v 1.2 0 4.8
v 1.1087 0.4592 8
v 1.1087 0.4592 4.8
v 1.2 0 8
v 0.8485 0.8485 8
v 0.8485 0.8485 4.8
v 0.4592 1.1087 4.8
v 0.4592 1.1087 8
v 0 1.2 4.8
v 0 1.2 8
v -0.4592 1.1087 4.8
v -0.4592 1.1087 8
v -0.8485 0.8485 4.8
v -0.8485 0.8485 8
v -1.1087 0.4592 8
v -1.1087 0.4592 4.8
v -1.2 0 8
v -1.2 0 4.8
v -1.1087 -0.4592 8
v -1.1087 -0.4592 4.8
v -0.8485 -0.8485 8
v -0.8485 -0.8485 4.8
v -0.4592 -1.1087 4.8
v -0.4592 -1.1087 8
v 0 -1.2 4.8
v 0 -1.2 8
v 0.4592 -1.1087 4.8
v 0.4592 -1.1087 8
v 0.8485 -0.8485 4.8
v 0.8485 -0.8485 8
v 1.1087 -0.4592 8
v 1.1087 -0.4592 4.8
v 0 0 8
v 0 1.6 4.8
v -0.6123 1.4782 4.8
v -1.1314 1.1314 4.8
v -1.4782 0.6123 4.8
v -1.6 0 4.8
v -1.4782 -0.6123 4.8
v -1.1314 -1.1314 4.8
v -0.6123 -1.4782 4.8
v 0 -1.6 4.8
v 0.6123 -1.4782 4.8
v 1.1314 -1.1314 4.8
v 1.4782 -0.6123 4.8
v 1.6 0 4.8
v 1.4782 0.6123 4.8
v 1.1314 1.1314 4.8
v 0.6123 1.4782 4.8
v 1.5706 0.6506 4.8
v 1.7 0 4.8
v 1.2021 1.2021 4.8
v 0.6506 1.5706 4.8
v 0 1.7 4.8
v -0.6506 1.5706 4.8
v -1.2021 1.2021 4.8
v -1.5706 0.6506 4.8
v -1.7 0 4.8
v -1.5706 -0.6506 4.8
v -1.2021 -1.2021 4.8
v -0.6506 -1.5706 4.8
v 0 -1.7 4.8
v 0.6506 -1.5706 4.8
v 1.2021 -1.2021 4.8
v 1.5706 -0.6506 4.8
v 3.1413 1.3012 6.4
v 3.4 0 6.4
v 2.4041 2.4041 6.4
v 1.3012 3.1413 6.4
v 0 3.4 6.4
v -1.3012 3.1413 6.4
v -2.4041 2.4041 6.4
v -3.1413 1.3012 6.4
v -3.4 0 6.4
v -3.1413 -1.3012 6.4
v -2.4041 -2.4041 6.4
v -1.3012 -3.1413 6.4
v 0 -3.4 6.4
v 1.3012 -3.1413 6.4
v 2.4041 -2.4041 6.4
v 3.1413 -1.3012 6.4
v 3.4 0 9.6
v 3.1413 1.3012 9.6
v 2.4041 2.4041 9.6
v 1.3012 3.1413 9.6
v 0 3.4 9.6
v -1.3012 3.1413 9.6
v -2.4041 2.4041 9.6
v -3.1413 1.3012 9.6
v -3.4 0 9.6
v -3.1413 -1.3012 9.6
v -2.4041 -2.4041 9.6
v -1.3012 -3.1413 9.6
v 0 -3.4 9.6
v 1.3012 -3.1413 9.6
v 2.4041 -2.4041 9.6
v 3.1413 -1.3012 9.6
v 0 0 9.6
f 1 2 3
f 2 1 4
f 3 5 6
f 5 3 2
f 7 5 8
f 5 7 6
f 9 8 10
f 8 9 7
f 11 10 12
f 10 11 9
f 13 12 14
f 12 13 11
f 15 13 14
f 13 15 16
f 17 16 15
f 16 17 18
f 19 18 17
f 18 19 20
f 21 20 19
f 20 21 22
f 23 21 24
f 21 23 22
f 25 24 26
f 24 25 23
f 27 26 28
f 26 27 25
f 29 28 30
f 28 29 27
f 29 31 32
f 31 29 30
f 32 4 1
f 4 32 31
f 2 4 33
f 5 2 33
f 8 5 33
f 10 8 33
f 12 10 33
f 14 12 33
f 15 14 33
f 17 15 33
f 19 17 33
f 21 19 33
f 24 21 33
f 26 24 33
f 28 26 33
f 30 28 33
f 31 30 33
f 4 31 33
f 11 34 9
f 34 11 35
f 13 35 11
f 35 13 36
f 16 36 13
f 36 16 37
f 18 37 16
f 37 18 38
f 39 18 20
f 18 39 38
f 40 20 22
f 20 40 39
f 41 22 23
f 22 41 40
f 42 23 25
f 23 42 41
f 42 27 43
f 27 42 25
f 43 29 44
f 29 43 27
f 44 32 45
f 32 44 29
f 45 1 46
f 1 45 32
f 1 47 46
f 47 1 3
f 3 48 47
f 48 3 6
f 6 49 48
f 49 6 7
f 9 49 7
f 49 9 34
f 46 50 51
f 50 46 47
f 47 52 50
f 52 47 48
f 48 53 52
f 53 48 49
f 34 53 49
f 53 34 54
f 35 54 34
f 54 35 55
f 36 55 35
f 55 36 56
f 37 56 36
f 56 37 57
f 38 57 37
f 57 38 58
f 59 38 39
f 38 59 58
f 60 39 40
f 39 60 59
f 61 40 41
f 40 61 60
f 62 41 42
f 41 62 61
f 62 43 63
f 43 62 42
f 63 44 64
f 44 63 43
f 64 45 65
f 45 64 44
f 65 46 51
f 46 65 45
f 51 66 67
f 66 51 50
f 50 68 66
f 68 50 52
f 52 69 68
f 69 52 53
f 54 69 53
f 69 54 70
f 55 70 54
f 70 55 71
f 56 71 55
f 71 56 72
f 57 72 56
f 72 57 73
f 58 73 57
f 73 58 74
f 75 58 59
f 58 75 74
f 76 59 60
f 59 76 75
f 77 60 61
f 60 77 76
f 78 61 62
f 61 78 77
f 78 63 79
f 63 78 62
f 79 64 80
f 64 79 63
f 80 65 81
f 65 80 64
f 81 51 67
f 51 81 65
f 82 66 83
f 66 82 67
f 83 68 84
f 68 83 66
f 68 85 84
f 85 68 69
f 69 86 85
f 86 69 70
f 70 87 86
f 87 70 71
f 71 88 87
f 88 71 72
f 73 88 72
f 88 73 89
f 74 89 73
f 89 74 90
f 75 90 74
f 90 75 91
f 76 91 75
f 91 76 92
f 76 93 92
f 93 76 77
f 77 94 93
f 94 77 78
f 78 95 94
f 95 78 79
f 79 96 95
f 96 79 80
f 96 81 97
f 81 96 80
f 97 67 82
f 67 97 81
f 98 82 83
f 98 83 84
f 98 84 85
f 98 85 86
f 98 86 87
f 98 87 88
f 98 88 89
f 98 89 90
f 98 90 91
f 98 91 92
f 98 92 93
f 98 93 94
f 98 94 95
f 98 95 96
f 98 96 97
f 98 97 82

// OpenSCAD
// file: ../../p/4-4ring3.scad
use <../lib.scad>
function ldraw_lib__4_4ring3() = [
// 0 Ring  3 x 1.0
// 0 Name: 4-4ring3.dat
// 0 Author: James Jessiman
// 0 !LDRAW_ORG Primitive UPDATE 2009-01
// 0 !LICENSE Licensed under CC BY 4.0 : see CAreadme.txt
// 
// 0 BFC CERTIFY CCW
  [0,"BFC","CERTIFY"],
  [0,"BFC","CCW"],
// 
// 0 !HISTORY 1998-12-15 [PTadmin] Official Update 1998-10
// 0 !HISTORY 2002-04-05 [hafhead] Added BFC statement
// 0 !HISTORY 2002-04-25 [PTadmin] Official Update 2002-02
// 0 !HISTORY 2007-06-24 [PTadmin] Header formatted for Contributor Agreement
// 0 !HISTORY 2008-07-01 [PTadmin] Official Update 2008-01
// 0 !HISTORY 2008-08-26 [cwdee] Switch polygon winding and rename
// 0 !HISTORY 2009-05-02 [PTadmin] Official Update 2009-01
// 
// 
// 4 16 -1.5308 0 3.6956 -1.1481 0 2.7717 0 0 3 0 0 4
  [4,16,-1.5308,0,3.6956,-1.1481,0,2.7717,0,0,3,0,0,4],
// 4 16 -2.8284 0 2.8284 -2.1213 0 2.1213 -1.1481 0 2.7717 -1.5308 0 3.6956
  [4,16,-2.8284,0,2.8284,-2.1213,0,2.1213,-1.1481,0,2.7717,-1.5308,0,3.6956],
// 4 16 -3.6956 0 1.5308 -2.7717 0 1.1481 -2.1213 0 2.1213 -2.8284 0 2.8284
  [4,16,-3.6956,0,1.5308,-2.7717,0,1.1481,-2.1213,0,2.1213,-2.8284,0,2.8284],
// 4 16 -4 0 0 -3 0 0 -2.7717 0 1.1481 -3.6956 0 1.5308
  [4,16,-4,0,0,-3,0,0,-2.7717,0,1.1481,-3.6956,0,1.5308],
// 4 16 -3.6956 0 -1.5308 -2.7717 0 -1.1481 -3 0 0 -4 0 0
  [4,16,-3.6956,0,-1.5308,-2.7717,0,-1.1481,-3,0,0,-4,0,0],
// 4 16 -2.8284 0 -2.8284 -2.1213 0 -2.1213 -2.7717 0 -1.1481 -3.6956 0 -1.5308
  [4,16,-2.8284,0,-2.8284,-2.1213,0,-2.1213,-2.7717,0,-1.1481,-3.6956,0,-1.5308],
// 4 16 -1.5308 0 -3.6956 -1.1481 0 -2.7717 -2.1213 0 -2.1213 -2.8284 0 -2.8284
  [4,16,-1.5308,0,-3.6956,-1.1481,0,-2.7717,-2.1213,0,-2.1213,-2.8284,0,-2.8284],
// 4 16 0 0 -4 0 0 -3 -1.1481 0 -2.7717 -1.5308 0 -3.6956
  [4,16,0,0,-4,0,0,-3,-1.1481,0,-2.7717,-1.5308,0,-3.6956],
// 4 16 1.5308 0 -3.6956 1.1481 0 -2.7717 0 0 -3 0 0 -4
  [4,16,1.5308,0,-3.6956,1.1481,0,-2.7717,0,0,-3,0,0,-4],
// 4 16 2.8284 0 -2.8284 2.1213 0 -2.1213 1.1481 0 -2.7717 1.5308 0 -3.6956
  [4,16,2.8284,0,-2.8284,2.1213,0,-2.1213,1.1481,0,-2.7717,1.5308,0,-3.6956],
// 4 16 3.6956 0 -1.5308 2.7717 0 -1.1481 2.1213 0 -2.1213 2.8284 0 -2.8284
  [4,16,3.6956,0,-1.5308,2.7717,0,-1.1481,2.1213,0,-2.1213,2.8284,0,-2.8284],
// 4 16 4 0 0 3 0 0 2.7717 0 -1.1481 3.6956 0 -1.5308
  [4,16,4,0,0,3,0,0,2.7717,0,-1.1481,3.6956,0,-1.5308],
// 4 16 3.6956 0 1.5308 2.7717 0 1.1481 3 0 0 4 0 0
  [4,16,3.6956,0,1.5308,2.7717,0,1.1481,3,0,0,4,0,0],
// 4 16 2.8284 0 2.8284 2.1213 0 2.1213 2.7717 0 1.1481 3.6956 0 1.5308
  [4,16,2.8284,0,2.8284,2.1213,0,2.1213,2.7717,0,1.1481,3.6956,0,1.5308],
// 4 16 1.5308 0 3.6956 1.1481 0 2.7717 2.1213 0 2.1213 2.8284 0 2.8284
  [4,16,1.5308,0,3.6956,1.1481,0,2.7717,2.1213,0,2.1213,2.8284,0,2.8284],
// 4 16 0 0 4 0 0 3 1.1481 0 2.7717 1.5308 0 3.6956
  [4,16,0,0,4,0,0,3,1.1481,0,2.7717,1.5308,0,3.6956],
// 0
];
module ldraw_lib__4_4ring3(step=0, col=false, unit=2/5, alt=false, line=0.2, solid=!$preview)
    makepoly(ldraw_lib__4_4ring3(), step=step, col=col, unit=unit, alt=alt, line=line, solid=solid);
ldraw_lib__4_4ring3(line=0.2);
// file: ../../p/4-4ring16.scad
use <../lib.scad>
function ldraw_lib__4_4ring16() = [
// 0 Ring 16 x 1.0
// 0 Name: 4-4ring16.dat
// 0 Author: Willy Tschager [Holly-Wood]
// 0 !LDRAW_ORG Primitive UPDATE 2024-02
// 0 !LICENSE Licensed under CC BY 4.0 : see CAreadme.txt
// 
// 0 BFC CERTIFY CCW
  [0,"BFC","CERTIFY"],
  [0,"BFC","CCW"],
// 
// 0 !HISTORY 2009-05-02 [PTadmin] Official Update 2009-01
// 0 !HISTORY 2024-01-11 [Holly-Wood] Complete regeneration, original by guyvivan
// 0 !HISTORY 2024-03-24 [OrionP] Official Update 2024-02
// 
// 4 16 17 0 0 15.7063 0 6.5059 14.7824 0 6.1232 16 0 0
  [4,16,17,0,0,15.7063,0,6.5059,14.7824,0,6.1232,16,0,0],
// 4 16 15.7063 0 6.5059 12.0207 0 12.0207 11.3136 0 11.3136 14.7824 0 6.1232
  [4,16,15.7063,0,6.5059,12.0207,0,12.0207,11.3136,0,11.3136,14.7824,0,6.1232],
// 4 16 12.0207 0 12.0207 6.5059 0 15.7063 6.1232 0 14.7824 11.3136 0 11.3136
  [4,16,12.0207,0,12.0207,6.5059,0,15.7063,6.1232,0,14.7824,11.3136,0,11.3136],
// 4 16 6.5059 0 15.7063 0 0 17 0 0 16 6.1232 0 14.7824
  [4,16,6.5059,0,15.7063,0,0,17,0,0,16,6.1232,0,14.7824],
// 4 16 0 0 17 -6.5059 0 15.7063 -6.1232 0 14.7824 0 0 16
  [4,16,0,0,17,-6.5059,0,15.7063,-6.1232,0,14.7824,0,0,16],
// 4 16 -6.5059 0 15.7063 -12.0207 0 12.0207 -11.3136 0 11.3136 -6.1232 0 14.7824
  [4,16,-6.5059,0,15.7063,-12.0207,0,12.0207,-11.3136,0,11.3136,-6.1232,0,14.7824],
// 4 16 -12.0207 0 12.0207 -15.7063 0 6.5059 -14.7824 0 6.1232 -11.3136 0 11.3136
  [4,16,-12.0207,0,12.0207,-15.7063,0,6.5059,-14.7824,0,6.1232,-11.3136,0,11.3136],
// 4 16 -15.7063 0 6.5059 -17 0 0 -16 0 0 -14.7824 0 6.1232
  [4,16,-15.7063,0,6.5059,-17,0,0,-16,0,0,-14.7824,0,6.1232],
// 4 16 -17 0 0 -15.7063 0 -6.5059 -14.7824 0 -6.1232 -16 0 0
  [4,16,-17,0,0,-15.7063,0,-6.5059,-14.7824,0,-6.1232,-16,0,0],
// 4 16 -15.7063 0 -6.5059 -12.0207 0 -12.0207 -11.3136 0 -11.3136 -14.7824 0 -6.1232
  [4,16,-15.7063,0,-6.5059,-12.0207,0,-12.0207,-11.3136,0,-11.3136,-14.7824,0,-6.1232],
// 4 16 -12.0207 0 -12.0207 -6.5059 0 -15.7063 -6.1232 0 -14.7824 -11.3136 0 -11.3136
  [4,16,-12.0207,0,-12.0207,-6.5059,0,-15.7063,-6.1232,0,-14.7824,-11.3136,0,-11.3136],
// 4 16 -6.5059 0 -15.7063 0 0 -17 0 0 -16 -6.1232 0 -14.7824
  [4,16,-6.5059,0,-15.7063,0,0,-17,0,0,-16,-6.1232,0,-14.7824],
// 4 16 0 0 -17 6.5059 0 -15.7063 6.1232 0 -14.7824 0 0 -16
  [4,16,0,0,-17,6.5059,0,-15.7063,6.1232,0,-14.7824,0,0,-16],
// 4 16 6.5059 0 -15.7063 12.0207 0 -12.0207 11.3136 0 -11.3136 6.1232 0 -14.7824
  [4,16,6.5059,0,-15.7063,12.0207,0,-12.0207,11.3136,0,-11.3136,6.1232,0,-14.7824],
// 4 16 12.0207 0 -12.0207 15.7063 0 -6.5059 14.7824 0 -6.1232 11.3136 0 -11.3136
  [4,16,12.0207,0,-12.0207,15.7063,0,-6.5059,14.7824,0,-6.1232,11.3136,0,-11.3136],
// 4 16 15.7063 0 -6.5059 17 0 0 16 0 0 14.7824 0 -6.1232
  [4,16,15.7063,0,-6.5059,17,0,0,16,0,0,14.7824,0,-6.1232],
// 0 // Build by LDPartEditor (PrimGen 2.X)
];
module ldraw_lib__4_4ring16(step=0, col=false, unit=2/5, alt=false, line=0.2, solid=!$preview)
    makepoly(ldraw_lib__4_4ring16(), step=step, col=col, unit=unit, alt=alt, line=line, solid=solid);
ldraw_lib__4_4ring16(line=0.2);
// file: ../../p/4-4edge.scad
use <../lib.scad>
function ldraw_lib__4_4edge() = [
// 0 Circle 1.0
// 0 Name: 4-4edge.dat
// 0 Author: James Jessiman
// 0 !LDRAW_ORG Primitive UPDATE 2017-01
// 0 !LICENSE Licensed under CC BY 4.0 : see CAreadme.txt
// 
// 0 BFC CERTIFY CCW
  [0,"BFC","CERTIFY"],
  [0,"BFC","CCW"],
// 
// 0 !HISTORY 1998-12-15 [PTadmin] Official Update 1998-10
// 0 !HISTORY 2005-12-28 [PTadmin] Official Update 2005-01
// 0 !HISTORY 2007-06-24 [PTadmin] Header formatted for Contributor Agreement
// 0 !HISTORY 2008-07-01 [PTadmin] Official Update 2008-01
// 0 !HISTORY 2017-01-15 [Steffen] BFCed
// 0 !HISTORY 2017-12-30 [PTadmin] Official Update 2017-01
// 
// 
// 2 24 1 0 0 0.9239 0 0.3827
  [2,24,1,0,0,0.9239,0,0.3827],
// 2 24 0.9239 0 0.3827 0.7071 0 0.7071
  [2,24,0.9239,0,0.3827,0.7071,0,0.7071],
// 2 24 0.7071 0 0.7071 0.3827 0 0.9239
  [2,24,0.7071,0,0.7071,0.3827,0,0.9239],
// 2 24 0.3827 0 0.9239 0 0 1
  [2,24,0.3827,0,0.9239,0,0,1],
// 2 24 0 0 1 -0.3827 0 0.9239
  [2,24,0,0,1,-0.3827,0,0.9239],
// 2 24 -0.3827 0 0.9239 -0.7071 0 0.7071
  [2,24,-0.3827,0,0.9239,-0.7071,0,0.7071],
// 2 24 -0.7071 0 0.7071 -0.9239 0 0.3827
  [2,24,-0.7071,0,0.7071,-0.9239,0,0.3827],
// 2 24 -0.9239 0 0.3827 -1 0 -0
  [2,24,-0.9239,0,0.3827,-1,0,-0],
// 2 24 -1 0 -0 -0.9239 0 -0.3827
  [2,24,-1,0,-0,-0.9239,0,-0.3827],
// 2 24 -0.9239 0 -0.3827 -0.7071 0 -0.7071
  [2,24,-0.9239,0,-0.3827,-0.7071,0,-0.7071],
// 2 24 -0.7071 0 -0.7071 -0.3827 0 -0.9239
  [2,24,-0.7071,0,-0.7071,-0.3827,0,-0.9239],
// 2 24 -0.3827 0 -0.9239 0 0 -1
  [2,24,-0.3827,0,-0.9239,0,0,-1],
// 2 24 0 0 -1 0.3827 0 -0.9239
  [2,24,0,0,-1,0.3827,0,-0.9239],
// 2 24 0.3827 0 -0.9239 0.7071 0 -0.7071
  [2,24,0.3827,0,-0.9239,0.7071,0,-0.7071],
// 2 24 0.7071 0 -0.7071 0.9239 0 -0.3827
  [2,24,0.7071,0,-0.7071,0.9239,0,-0.3827],
// 2 24 0.9239 0 -0.3827 1 0 0
  [2,24,0.9239,0,-0.3827,1,0,0],
];
module ldraw_lib__4_4edge(step=0, col=false, unit=2/5, alt=false, line=0.2, solid=!$preview)
    makepoly(ldraw_lib__4_4edge(), step=step, col=col, unit=unit, alt=alt, line=line, solid=solid);
ldraw_lib__4_4edge(line=0.2);
// file: ../../p/4-4disc.scad
use <../lib.scad>
function ldraw_lib__4_4disc() = [
// 0 Disc 1.0
// 0 Name: 4-4disc.dat
// 0 Author: James Jessiman
// 0 !LDRAW_ORG Primitive UPDATE 2002-02
// 0 !LICENSE Licensed under CC BY 4.0 : see CAreadme.txt
// 
// 0 BFC CERTIFY CCW
  [0,"BFC","CERTIFY"],
  [0,"BFC","CCW"],
// 
// 0 !HISTORY 1998-12-15 [PTadmin] Official Update 1998-10
// 0 !HISTORY 2002-03-23 [sbliss] Added BFC statement
// 0 !HISTORY 2002-04-25 [PTadmin] Official Update 2002-02
// 0 !HISTORY 2007-06-24 [PTadmin] Header formatted for Contributor Agreement
// 0 !HISTORY 2008-07-01 [PTadmin] Official Update 2008-01
// 
// 
// 3 16 0 0 0 1 0 0 0.9239 0 0.3827
  [3,16,0,0,0,1,0,0,0.9239,0,0.3827],
// 3 16 0 0 0 0.9239 0 0.3827 0.7071 0 0.7071
  [3,16,0,0,0,0.9239,0,0.3827,0.7071,0,0.7071],
// 3 16 0 0 0 0.7071 0 0.7071 0.3827 0 0.9239
  [3,16,0,0,0,0.7071,0,0.7071,0.3827,0,0.9239],
// 3 16 0 0 0 0.3827 0 0.9239 0 0 1
  [3,16,0,0,0,0.3827,0,0.9239,0,0,1],
// 3 16 0 0 0 0 0 1 -0.3827 0 0.9239
  [3,16,0,0,0,0,0,1,-0.3827,0,0.9239],
// 3 16 0 0 0 -0.3827 0 0.9239 -0.7071 0 0.7071
  [3,16,0,0,0,-0.3827,0,0.9239,-0.7071,0,0.7071],
// 3 16 0 0 0 -0.7071 0 0.7071 -0.9239 0 0.3827
  [3,16,0,0,0,-0.7071,0,0.7071,-0.9239,0,0.3827],
// 3 16 0 0 0 -0.9239 0 0.3827 -1 0 -0
  [3,16,0,0,0,-0.9239,0,0.3827,-1,0,-0],
// 3 16 0 0 0 -1 0 -0 -0.9239 0 -0.3827
  [3,16,0,0,0,-1,0,-0,-0.9239,0,-0.3827],
// 3 16 0 0 0 -0.9239 0 -0.3827 -0.7071 0 -0.7071
  [3,16,0,0,0,-0.9239,0,-0.3827,-0.7071,0,-0.7071],
// 3 16 0 0 0 -0.7071 0 -0.7071 -0.3827 0 -0.9239
  [3,16,0,0,0,-0.7071,0,-0.7071,-0.3827,0,-0.9239],
// 3 16 0 0 0 -0.3827 0 -0.9239 0 0 -1
  [3,16,0,0,0,-0.3827,0,-0.9239,0,0,-1],
// 3 16 0 0 0 0 0 -1 0.3827 0 -0.9239
  [3,16,0,0,0,0,0,-1,0.3827,0,-0.9239],
// 3 16 0 0 0 0.3827 0 -0.9239 0.7071 0 -0.7071
  [3,16,0,0,0,0.3827,0,-0.9239,0.7071,0,-0.7071],
// 3 16 0 0 0 0.7071 0 -0.7071 0.9239 0 -0.3827
  [3,16,0,0,0,0.7071,0,-0.7071,0.9239,0,-0.3827],
// 3 16 0 0 0 0.9239 0 -0.3827 1 0 0
  [3,16,0,0,0,0.9239,0,-0.3827,1,0,0],
// 0
];
module ldraw_lib__4_4disc(step=0, col=false, unit=2/5, alt=false, line=0.2, solid=!$preview)
    makepoly(ldraw_lib__4_4disc(), step=step, col=col, unit=unit, alt=alt, line=line, solid=solid);
ldraw_lib__4_4disc(line=0.2);
// file: ../../p/4-4cylo.scad
use <../lib.scad>
use <4-4cyli.scad>
use <4-4edge.scad>
function ldraw_lib__4_4cylo() = [
// 0 Cylinder Open 1.0
// 0 Name: 4-4cylo.dat
// 0 Author: Mark Kennedy [mkennedy]
// 0 !LDRAW_ORG Primitive UPDATE 2010-01
// 0 !LICENSE Licensed under CC BY 4.0 : see CAreadme.txt
// 
// 0 BFC CERTIFY CCW
  [0,"BFC","CERTIFY"],
  [0,"BFC","CCW"],
// 
// 0 !HISTORY 2010-04-05 [PTadmin] Official Update 2010-01
// 
// 
// 1 16 0 0 0 1 0 0 0 1 0 0 0 1 4-4edge.dat
  [1,16,0,0,0,1,0,0,0,1,0,0,0,1, ldraw_lib__4_4edge()],
// 1 16 0 1 0 1 0 0 0 1 0 0 0 1 4-4edge.dat
  [1,16,0,1,0,1,0,0,0,1,0,0,0,1, ldraw_lib__4_4edge()],
// 1 16 0 0 0 1 0 0 0 1 0 0 0 1 4-4cyli.dat
  [1,16,0,0,0,1,0,0,0,1,0,0,0,1, ldraw_lib__4_4cyli()],
// 0
];
module ldraw_lib__4_4cylo(step=0, col=false, unit=2/5, alt=false, line=0.2, solid=!$preview)
    makepoly(ldraw_lib__4_4cylo(), step=step, col=col, unit=unit, alt=alt, line=line, solid=solid);
ldraw_lib__4_4cylo(line=0.2);
// file: ../../p/4-4cyli.scad
use <../lib.scad>
function ldraw_lib__4_4cyli() = [
// 0 Cylinder 1.0
// 0 Name: 4-4cyli.dat
// 0 Author: James Jessiman
// 0 !LDRAW_ORG Primitive UPDATE 2005-01
// 0 !LICENSE Licensed under CC BY 4.0 : see CAreadme.txt
// 
// 0 BFC CERTIFY CCW
  [0,"BFC","CERTIFY"],
  [0,"BFC","CCW"],
// 
// 0 !HISTORY 1998-12-15 [PTadmin] Official Update 1998-10
// 0 !HISTORY 2002-03-23 [sbliss] Added BFC statement; merged headers from files in distributions LDraw 0.27 and Complete.
// 0 !HISTORY 2002-04-25 [PTadmin] Official Update 2002-02
// 0 !HISTORY 2004-12-14 [guyvivan] BFC CCW
// 0 !HISTORY 2005-12-28 [PTadmin] Official Update 2005-01
// 0 !HISTORY 2007-06-24 [PTadmin] Header formatted for Contributor Agreement
// 0 !HISTORY 2008-07-01 [PTadmin] Official Update 2008-01
// 
// 
// 4 16 1 1 0 0.9239 1 0.3827 0.9239 0 0.3827 1 0 0
  [4,16,1,1,0,0.9239,1,0.3827,0.9239,0,0.3827,1,0,0],
// 5 24 1 0 0 1 1 0 0.9239 0 0.3827 0.9239 0 -0.3827
  [5,24,1,0,0,1,1,0,0.9239,0,0.3827,0.9239,0,-0.3827],
// 4 16 0.9239 1 0.3827 0.7071 1 0.7071 0.7071 0 0.7071 0.9239 0 0.3827
  [4,16,0.9239,1,0.3827,0.7071,1,0.7071,0.7071,0,0.7071,0.9239,0,0.3827],
// 5 24 0.9239 0 0.3827 0.9239 1 0.3827 0.7071 0 0.7071 1 0 0
  [5,24,0.9239,0,0.3827,0.9239,1,0.3827,0.7071,0,0.7071,1,0,0],
// 4 16 0.7071 1 0.7071 0.3827 1 0.9239 0.3827 0 0.9239 0.7071 0 0.7071
  [4,16,0.7071,1,0.7071,0.3827,1,0.9239,0.3827,0,0.9239,0.7071,0,0.7071],
// 5 24 0.7071 0 0.7071 0.7071 1 0.7071 0.3827 0 0.9239 0.9239 0 0.3827
  [5,24,0.7071,0,0.7071,0.7071,1,0.7071,0.3827,0,0.9239,0.9239,0,0.3827],
// 4 16 0.3827 1 0.9239 0 1 1 0 0 1 0.3827 0 0.9239
  [4,16,0.3827,1,0.9239,0,1,1,0,0,1,0.3827,0,0.9239],
// 5 24 0.3827 0 0.9239 0.3827 1 0.9239 0 0 1 0.7071 0 0.7071
  [5,24,0.3827,0,0.9239,0.3827,1,0.9239,0,0,1,0.7071,0,0.7071],
// 4 16 0 1 1 -0.3827 1 0.9239 -0.3827 0 0.9239 0 0 1
  [4,16,0,1,1,-0.3827,1,0.9239,-0.3827,0,0.9239,0,0,1],
// 5 24 0 0 1 0 1 1 -0.3827 0 0.9239 0.3827 0 0.9239
  [5,24,0,0,1,0,1,1,-0.3827,0,0.9239,0.3827,0,0.9239],
// 4 16 -0.3827 1 0.9239 -0.7071 1 0.7071 -0.7071 0 0.7071 -0.3827 0 0.9239
  [4,16,-0.3827,1,0.9239,-0.7071,1,0.7071,-0.7071,0,0.7071,-0.3827,0,0.9239],
// 5 24 -0.3827 0 0.9239 -0.3827 1 0.9239 -0.7071 0 0.7071 0 0 1
  [5,24,-0.3827,0,0.9239,-0.3827,1,0.9239,-0.7071,0,0.7071,0,0,1],
// 4 16 -0.7071 1 0.7071 -0.9239 1 0.3827 -0.9239 0 0.3827 -0.7071 0 0.7071
  [4,16,-0.7071,1,0.7071,-0.9239,1,0.3827,-0.9239,0,0.3827,-0.7071,0,0.7071],
// 5 24 -0.7071 0 0.7071 -0.7071 1 0.7071 -0.9239 0 0.3827 -0.3827 0 0.9239
  [5,24,-0.7071,0,0.7071,-0.7071,1,0.7071,-0.9239,0,0.3827,-0.3827,0,0.9239],
// 4 16 -0.9239 1 0.3827 -1 1 0 -1 0 0 -0.9239 0 0.3827
  [4,16,-0.9239,1,0.3827,-1,1,0,-1,0,0,-0.9239,0,0.3827],
// 5 24 -0.9239 0 0.3827 -0.9239 1 0.3827 -1 0 0 -0.7071 0 0.7071
  [5,24,-0.9239,0,0.3827,-0.9239,1,0.3827,-1,0,0,-0.7071,0,0.7071],
// 4 16 -1 1 0 -0.9239 1 -0.3827 -0.9239 0 -0.3827 -1 0 0
  [4,16,-1,1,0,-0.9239,1,-0.3827,-0.9239,0,-0.3827,-1,0,0],
// 5 24 -1 0 0 -1 1 0 -0.9239 0 -0.3827 -0.9239 0 0.3827
  [5,24,-1,0,0,-1,1,0,-0.9239,0,-0.3827,-0.9239,0,0.3827],
// 4 16 -0.9239 1 -0.3827 -0.7071 1 -0.7071 -0.7071 0 -0.7071 -0.9239 0 -0.3827
  [4,16,-0.9239,1,-0.3827,-0.7071,1,-0.7071,-0.7071,0,-0.7071,-0.9239,0,-0.3827],
// 5 24 -0.9239 0 -0.3827 -0.9239 1 -0.3827 -0.7071 0 -0.7071 -1 0 0
  [5,24,-0.9239,0,-0.3827,-0.9239,1,-0.3827,-0.7071,0,-0.7071,-1,0,0],
// 4 16 -0.7071 1 -0.7071 -0.3827 1 -0.9239 -0.3827 0 -0.9239 -0.7071 0 -0.7071
  [4,16,-0.7071,1,-0.7071,-0.3827,1,-0.9239,-0.3827,0,-0.9239,-0.7071,0,-0.7071],
// 5 24 -0.7071 0 -0.7071 -0.7071 1 -0.7071 -0.3827 0 -0.9239 -0.9239 0 -0.3827
  [5,24,-0.7071,0,-0.7071,-0.7071,1,-0.7071,-0.3827,0,-0.9239,-0.9239,0,-0.3827],
// 4 16 -0.3827 1 -0.9239 0 1 -1 0 0 -1 -0.3827 0 -0.9239
  [4,16,-0.3827,1,-0.9239,0,1,-1,0,0,-1,-0.3827,0,-0.9239],
// 5 24 -0.3827 0 -0.9239 -0.3827 1 -0.9239 0 0 -1 -0.7071 0 -0.7071
  [5,24,-0.3827,0,-0.9239,-0.3827,1,-0.9239,0,0,-1,-0.7071,0,-0.7071],
// 4 16 0 1 -1 0.3827 1 -0.9239 0.3827 0 -0.9239 0 0 -1
  [4,16,0,1,-1,0.3827,1,-0.9239,0.3827,0,-0.9239,0,0,-1],
// 5 24 0 0 -1 0 1 -1 0.3827 0 -0.9239 -0.3827 0 -0.9239
  [5,24,0,0,-1,0,1,-1,0.3827,0,-0.9239,-0.3827,0,-0.9239],
// 4 16 0.3827 1 -0.9239 0.7071 1 -0.7071 0.7071 0 -0.7071 0.3827 0 -0.9239
  [4,16,0.3827,1,-0.9239,0.7071,1,-0.7071,0.7071,0,-0.7071,0.3827,0,-0.9239],
// 5 24 0.3827 0 -0.9239 0.3827 1 -0.9239 0.7071 0 -0.7071 0 0 -1
  [5,24,0.3827,0,-0.9239,0.3827,1,-0.9239,0.7071,0,-0.7071,0,0,-1],
// 4 16 0.7071 1 -0.7071 0.9239 1 -0.3827 0.9239 0 -0.3827 0.7071 0 -0.7071
  [4,16,0.7071,1,-0.7071,0.9239,1,-0.3827,0.9239,0,-0.3827,0.7071,0,-0.7071],
// 5 24 0.7071 0 -0.7071 0.7071 1 -0.7071 0.9239 0 -0.3827 0.3827 0 -0.9239
  [5,24,0.7071,0,-0.7071,0.7071,1,-0.7071,0.9239,0,-0.3827,0.3827,0,-0.9239],
// 4 16 0.9239 1 -0.3827 1 1 0 1 0 0 0.9239 0 -0.3827
  [4,16,0.9239,1,-0.3827,1,1,0,1,0,0,0.9239,0,-0.3827],
// 5 24 0.9239 0 -0.3827 0.9239 1 -0.3827 1 0 0 0.7071 0 -0.7071
  [5,24,0.9239,0,-0.3827,0.9239,1,-0.3827,1,0,0,0.7071,0,-0.7071],
// 0
];
module ldraw_lib__4_4cyli(step=0, col=false, unit=2/5, alt=false, line=0.2, solid=!$preview)
    makepoly(ldraw_lib__4_4cyli(), step=step, col=col, unit=unit, alt=alt, line=line, solid=solid);
ldraw_lib__4_4cyli(line=0.2);
// file: ../../p/4-4con1.scad
use <../lib.scad>
function ldraw_lib__4_4con1() = [
// 0 Cone  1 x 1.0
// 0 Name: 4-4con1.dat
// 0 Author: Steve Bliss [sbliss]
// 0 !LDRAW_ORG Primitive UPDATE 2012-01
// 0 !LICENSE Licensed under CC BY 4.0 : see CAreadme.txt
// 
// 0 BFC CERTIFY CCW
  [0,"BFC","CERTIFY"],
  [0,"BFC","CCW"],
// 
// 0 !HISTORY 1999-08-19 [sbliss] Renamed 4-4con12.dat to 4-4con1.dat, Moved all conditional lines before quads
// 0 !HISTORY 2000-05-07 [PTadmin] Official Update 2000-01
// 0 !HISTORY 2002-12-11 [cwdee] Standardised title and made BFC compliant
// 0 !HISTORY 2003-08-01 [PTadmin] Official Update 2003-02
// 0 !HISTORY 2007-06-24 [PTadmin] Header formatted for Contributor Agreement
// 0 !HISTORY 2008-07-01 [PTadmin] Official Update 2008-01
// 0 !HISTORY 2012-02-16 [Philo] Changed to CCW, reordered
// 0 !HISTORY 2012-03-30 [PTadmin] Official Update 2012-01
// 
// 
// 5 24 1 1 0 2 0 0 0.9239 1 -0.3827 0.9239 1 0.3827
  [5,24,1,1,0,2,0,0,0.9239,1,-0.3827,0.9239,1,0.3827],
// 5 24 0.9239 1 0.3827 1.8478 0 0.7654 1 1 0 0.7071 1 0.7071
  [5,24,0.9239,1,0.3827,1.8478,0,0.7654,1,1,0,0.7071,1,0.7071],
// 5 24 0.7071 1 0.7071 1.4142 0 1.4142 0.9239 1 0.3827 0.3827 1 0.9239
  [5,24,0.7071,1,0.7071,1.4142,0,1.4142,0.9239,1,0.3827,0.3827,1,0.9239],
// 5 24 0.3827 1 0.9239 0.7654 0 1.8478 0.7071 1 0.7071 0 1 1
  [5,24,0.3827,1,0.9239,0.7654,0,1.8478,0.7071,1,0.7071,0,1,1],
// 5 24 0 1 1 0 0 2 0.3827 1 0.9239 -0.3827 1 0.9239
  [5,24,0,1,1,0,0,2,0.3827,1,0.9239,-0.3827,1,0.9239],
// 5 24 -0.3827 1 0.9239 -0.7654 0 1.8478 0 1 1 -0.7071 1 0.7071
  [5,24,-0.3827,1,0.9239,-0.7654,0,1.8478,0,1,1,-0.7071,1,0.7071],
// 5 24 -0.7071 1 0.7071 -1.4142 0 1.4142 -0.3827 1 0.9239 -0.9239 1 0.3827
  [5,24,-0.7071,1,0.7071,-1.4142,0,1.4142,-0.3827,1,0.9239,-0.9239,1,0.3827],
// 5 24 -0.9239 1 0.3827 -1.8478 0 0.7654 -0.7071 1 0.7071 -1 1 0
  [5,24,-0.9239,1,0.3827,-1.8478,0,0.7654,-0.7071,1,0.7071,-1,1,0],
// 5 24 -1 1 0 -2 0 0 -0.9239 1 0.3827 -0.9239 1 -0.3827
  [5,24,-1,1,0,-2,0,0,-0.9239,1,0.3827,-0.9239,1,-0.3827],
// 5 24 -0.9239 1 -0.3827 -1.8478 0 -0.7654 -1 1 0 -0.7071 1 -0.7071
  [5,24,-0.9239,1,-0.3827,-1.8478,0,-0.7654,-1,1,0,-0.7071,1,-0.7071],
// 5 24 -0.7071 1 -0.7071 -1.4142 0 -1.4142 -0.9239 1 -0.3827 -0.3827 1 -0.9239
  [5,24,-0.7071,1,-0.7071,-1.4142,0,-1.4142,-0.9239,1,-0.3827,-0.3827,1,-0.9239],
// 5 24 -0.3827 1 -0.9239 -0.7654 0 -1.8478 -0.7071 1 -0.7071 0 1 -1
  [5,24,-0.3827,1,-0.9239,-0.7654,0,-1.8478,-0.7071,1,-0.7071,0,1,-1],
// 5 24 0 1 -1 0 0 -2 -0.3827 1 -0.9239 0.3827 1 -0.9239
  [5,24,0,1,-1,0,0,-2,-0.3827,1,-0.9239,0.3827,1,-0.9239],
// 5 24 0.3827 1 -0.9239 0.7654 0 -1.8478 0 1 -1 0.7071 1 -0.7071
  [5,24,0.3827,1,-0.9239,0.7654,0,-1.8478,0,1,-1,0.7071,1,-0.7071],
// 5 24 0.7071 1 -0.7071 1.4142 0 -1.4142 0.3827 1 -0.9239 0.9239 1 -0.3827
  [5,24,0.7071,1,-0.7071,1.4142,0,-1.4142,0.3827,1,-0.9239,0.9239,1,-0.3827],
// 5 24 0.9239 1 -0.3827 1.8478 0 -0.7654 0.7071 1 -0.7071 1 1 0
  [5,24,0.9239,1,-0.3827,1.8478,0,-0.7654,0.7071,1,-0.7071,1,1,0],
// 
// 4 16 2 0 0 1 1 0 0.9239 1 0.3827 1.8478 0 0.7654
  [4,16,2,0,0,1,1,0,0.9239,1,0.3827,1.8478,0,0.7654],
// 4 16 1.8478 0 0.7654 0.9239 1 0.3827 0.7071 1 0.7071 1.4142 0 1.4142
  [4,16,1.8478,0,0.7654,0.9239,1,0.3827,0.7071,1,0.7071,1.4142,0,1.4142],
// 4 16 1.4142 0 1.4142 0.7071 1 0.7071 0.3827 1 0.9239 0.7654 0 1.8478
  [4,16,1.4142,0,1.4142,0.7071,1,0.7071,0.3827,1,0.9239,0.7654,0,1.8478],
// 4 16 0.7654 0 1.8478 0.3827 1 0.9239 0 1 1 0 0 2
  [4,16,0.7654,0,1.8478,0.3827,1,0.9239,0,1,1,0,0,2],
// 4 16 0 0 2 0 1 1 -0.3827 1 0.9239 -0.7654 0 1.8478
  [4,16,0,0,2,0,1,1,-0.3827,1,0.9239,-0.7654,0,1.8478],
// 4 16 -0.7654 0 1.8478 -0.3827 1 0.9239 -0.7071 1 0.7071 -1.4142 0 1.4142
  [4,16,-0.7654,0,1.8478,-0.3827,1,0.9239,-0.7071,1,0.7071,-1.4142,0,1.4142],
// 4 16 -1.4142 0 1.4142 -0.7071 1 0.7071 -0.9239 1 0.3827 -1.8478 0 0.7654
  [4,16,-1.4142,0,1.4142,-0.7071,1,0.7071,-0.9239,1,0.3827,-1.8478,0,0.7654],
// 4 16 -1.8478 0 0.7654 -0.9239 1 0.3827 -1 1 0 -2 0 0
  [4,16,-1.8478,0,0.7654,-0.9239,1,0.3827,-1,1,0,-2,0,0],
// 4 16 -2 0 0 -1 1 0 -0.9239 1 -0.3827 -1.8478 0 -0.7654
  [4,16,-2,0,0,-1,1,0,-0.9239,1,-0.3827,-1.8478,0,-0.7654],
// 4 16 -1.8478 0 -0.7654 -0.9239 1 -0.3827 -0.7071 1 -0.7071 -1.4142 0 -1.4142
  [4,16,-1.8478,0,-0.7654,-0.9239,1,-0.3827,-0.7071,1,-0.7071,-1.4142,0,-1.4142],
// 4 16 -1.4142 0 -1.4142 -0.7071 1 -0.7071 -0.3827 1 -0.9239 -0.7654 0 -1.8478
  [4,16,-1.4142,0,-1.4142,-0.7071,1,-0.7071,-0.3827,1,-0.9239,-0.7654,0,-1.8478],
// 4 16 -0.7654 0 -1.8478 -0.3827 1 -0.9239 0 1 -1 0 0 -2
  [4,16,-0.7654,0,-1.8478,-0.3827,1,-0.9239,0,1,-1,0,0,-2],
// 4 16 0 0 -2 0 1 -1 0.3827 1 -0.9239 0.7654 0 -1.8478
  [4,16,0,0,-2,0,1,-1,0.3827,1,-0.9239,0.7654,0,-1.8478],
// 4 16 0.7654 0 -1.8478 0.3827 1 -0.9239 0.7071 1 -0.7071 1.4142 0 -1.4142
  [4,16,0.7654,0,-1.8478,0.3827,1,-0.9239,0.7071,1,-0.7071,1.4142,0,-1.4142],
// 4 16 1.4142 0 -1.4142 0.7071 1 -0.7071 0.9239 1 -0.3827 1.8478 0 -0.7654
  [4,16,1.4142,0,-1.4142,0.7071,1,-0.7071,0.9239,1,-0.3827,1.8478,0,-0.7654],
// 4 16 1.8478 0 -0.7654 0.9239 1 -0.3827 1 1 0 2 0 0
  [4,16,1.8478,0,-0.7654,0.9239,1,-0.3827,1,1,0,2,0,0],
];
module ldraw_lib__4_4con1(step=0, col=false, unit=2/5, alt=false, line=0.2, solid=!$preview)
    makepoly(ldraw_lib__4_4con1(), step=step, col=col, unit=unit, alt=alt, line=line, solid=solid);
ldraw_lib__4_4con1(line=0.2);
// main file
use <../../lib.scad>
use <../../p/4-4con1.scad>
use <../../p/4-4cyli.scad>
use <../../p/4-4cylo.scad>
use <../../p/4-4disc.scad>
use <../../p/4-4edge.scad>
use <../../p/4-4ring16.scad>
use <../../p/4-4ring3.scad>
function ldraw_lib__s__68495s02() = [
// 0 ~Minifig Cup Stein, Drink
// 0 Name: s\68495s02.dat
// 0 Author: Gerald Lasser [GeraldLasser]
// 0 !LDRAW_ORG Subpart UPDATE 2024-02
// 0 !LICENSE Licensed under CC BY 4.0 : see CAreadme.txt
// 
// 0 BFC CERTIFY CCW
  [0,"BFC","CERTIFY"],
  [0,"BFC","CCW"],
// 
// 0 !HISTORY 2022-07-18 [PTadmin] Official Update 2022-04
// 0 !HISTORY 2024-03-23 [OrionP] Updated ring primitives
// 0 !HISTORY 2024-03-24 [OrionP] Official Update 2024-02
// 
// 1 16 0 -12 0 4.25 0 0 0 -1 0 0 0 4.25 4-4edge.dat
  [1,16,0,-12,0,4.25,0,0,0,-1,0,0,0,4.25, ldraw_lib__4_4edge()],
// 0 BFC INVERTNEXT
  [0,"BFC","INVERTNEXT"],
// 1 16 0 -20 0 3 0 0 0 8 0 0 0 3 4-4cyli.dat
  [1,16,0,-20,0,3,0,0,0,8,0,0,0,3, ldraw_lib__4_4cyli()],
// 1 16 0 -20 0 3 0 0 0 -1 0 0 0 3 4-4disc.dat
  [1,16,0,-20,0,3,0,0,0,-1,0,0,0,3, ldraw_lib__4_4disc()],
// 1 16 0 -20 0 3 0 0 0 -1 0 0 0 3 4-4edge.dat
  [1,16,0,-20,0,3,0,0,0,-1,0,0,0,3, ldraw_lib__4_4edge()],
// 1 16 0 -12 0 1 0 0 0 -1 0 0 0 1 4-4ring3.dat
  [1,16,0,-12,0,1,0,0,0,-1,0,0,0,1, ldraw_lib__4_4ring3()],
// 1 16 0 -12 0 .25 0 0 0 -1 0 0 0 .25 4-4ring16.dat
  [1,16,0,-12,0,.25,0,0,0,-1,0,0,0,.25, ldraw_lib__4_4ring16()],
// 1 16 0 -16 0 4.25 0 0 0 4 0 0 0 4.25 4-4con1.dat
  [1,16,0,-16,0,4.25,0,0,0,4,0,0,0,4.25, ldraw_lib__4_4con1()],
// 1 16 0 -24 0 8.5 0 0 0 8 0 0 0 8.5 4-4cylo.dat
  [1,16,0,-24,0,8.5,0,0,0,8,0,0,0,8.5, ldraw_lib__4_4cylo()],
// 1 16 0 -24 0 8.5 0 0 0 1 0 0 0 8.5 4-4disc.dat
  [1,16,0,-24,0,8.5,0,0,0,1,0,0,0,8.5, ldraw_lib__4_4disc()],
];
module ldraw_lib__s__68495s02(step=0, col=false, unit=2/5, alt=false, line=0.2, solid=!$preview)
    makepoly(ldraw_lib__s__68495s02(), step=step, col=col, unit=unit, alt=alt, line=line, solid=solid);
ldraw_lib__s__68495s02(line=0.2);
